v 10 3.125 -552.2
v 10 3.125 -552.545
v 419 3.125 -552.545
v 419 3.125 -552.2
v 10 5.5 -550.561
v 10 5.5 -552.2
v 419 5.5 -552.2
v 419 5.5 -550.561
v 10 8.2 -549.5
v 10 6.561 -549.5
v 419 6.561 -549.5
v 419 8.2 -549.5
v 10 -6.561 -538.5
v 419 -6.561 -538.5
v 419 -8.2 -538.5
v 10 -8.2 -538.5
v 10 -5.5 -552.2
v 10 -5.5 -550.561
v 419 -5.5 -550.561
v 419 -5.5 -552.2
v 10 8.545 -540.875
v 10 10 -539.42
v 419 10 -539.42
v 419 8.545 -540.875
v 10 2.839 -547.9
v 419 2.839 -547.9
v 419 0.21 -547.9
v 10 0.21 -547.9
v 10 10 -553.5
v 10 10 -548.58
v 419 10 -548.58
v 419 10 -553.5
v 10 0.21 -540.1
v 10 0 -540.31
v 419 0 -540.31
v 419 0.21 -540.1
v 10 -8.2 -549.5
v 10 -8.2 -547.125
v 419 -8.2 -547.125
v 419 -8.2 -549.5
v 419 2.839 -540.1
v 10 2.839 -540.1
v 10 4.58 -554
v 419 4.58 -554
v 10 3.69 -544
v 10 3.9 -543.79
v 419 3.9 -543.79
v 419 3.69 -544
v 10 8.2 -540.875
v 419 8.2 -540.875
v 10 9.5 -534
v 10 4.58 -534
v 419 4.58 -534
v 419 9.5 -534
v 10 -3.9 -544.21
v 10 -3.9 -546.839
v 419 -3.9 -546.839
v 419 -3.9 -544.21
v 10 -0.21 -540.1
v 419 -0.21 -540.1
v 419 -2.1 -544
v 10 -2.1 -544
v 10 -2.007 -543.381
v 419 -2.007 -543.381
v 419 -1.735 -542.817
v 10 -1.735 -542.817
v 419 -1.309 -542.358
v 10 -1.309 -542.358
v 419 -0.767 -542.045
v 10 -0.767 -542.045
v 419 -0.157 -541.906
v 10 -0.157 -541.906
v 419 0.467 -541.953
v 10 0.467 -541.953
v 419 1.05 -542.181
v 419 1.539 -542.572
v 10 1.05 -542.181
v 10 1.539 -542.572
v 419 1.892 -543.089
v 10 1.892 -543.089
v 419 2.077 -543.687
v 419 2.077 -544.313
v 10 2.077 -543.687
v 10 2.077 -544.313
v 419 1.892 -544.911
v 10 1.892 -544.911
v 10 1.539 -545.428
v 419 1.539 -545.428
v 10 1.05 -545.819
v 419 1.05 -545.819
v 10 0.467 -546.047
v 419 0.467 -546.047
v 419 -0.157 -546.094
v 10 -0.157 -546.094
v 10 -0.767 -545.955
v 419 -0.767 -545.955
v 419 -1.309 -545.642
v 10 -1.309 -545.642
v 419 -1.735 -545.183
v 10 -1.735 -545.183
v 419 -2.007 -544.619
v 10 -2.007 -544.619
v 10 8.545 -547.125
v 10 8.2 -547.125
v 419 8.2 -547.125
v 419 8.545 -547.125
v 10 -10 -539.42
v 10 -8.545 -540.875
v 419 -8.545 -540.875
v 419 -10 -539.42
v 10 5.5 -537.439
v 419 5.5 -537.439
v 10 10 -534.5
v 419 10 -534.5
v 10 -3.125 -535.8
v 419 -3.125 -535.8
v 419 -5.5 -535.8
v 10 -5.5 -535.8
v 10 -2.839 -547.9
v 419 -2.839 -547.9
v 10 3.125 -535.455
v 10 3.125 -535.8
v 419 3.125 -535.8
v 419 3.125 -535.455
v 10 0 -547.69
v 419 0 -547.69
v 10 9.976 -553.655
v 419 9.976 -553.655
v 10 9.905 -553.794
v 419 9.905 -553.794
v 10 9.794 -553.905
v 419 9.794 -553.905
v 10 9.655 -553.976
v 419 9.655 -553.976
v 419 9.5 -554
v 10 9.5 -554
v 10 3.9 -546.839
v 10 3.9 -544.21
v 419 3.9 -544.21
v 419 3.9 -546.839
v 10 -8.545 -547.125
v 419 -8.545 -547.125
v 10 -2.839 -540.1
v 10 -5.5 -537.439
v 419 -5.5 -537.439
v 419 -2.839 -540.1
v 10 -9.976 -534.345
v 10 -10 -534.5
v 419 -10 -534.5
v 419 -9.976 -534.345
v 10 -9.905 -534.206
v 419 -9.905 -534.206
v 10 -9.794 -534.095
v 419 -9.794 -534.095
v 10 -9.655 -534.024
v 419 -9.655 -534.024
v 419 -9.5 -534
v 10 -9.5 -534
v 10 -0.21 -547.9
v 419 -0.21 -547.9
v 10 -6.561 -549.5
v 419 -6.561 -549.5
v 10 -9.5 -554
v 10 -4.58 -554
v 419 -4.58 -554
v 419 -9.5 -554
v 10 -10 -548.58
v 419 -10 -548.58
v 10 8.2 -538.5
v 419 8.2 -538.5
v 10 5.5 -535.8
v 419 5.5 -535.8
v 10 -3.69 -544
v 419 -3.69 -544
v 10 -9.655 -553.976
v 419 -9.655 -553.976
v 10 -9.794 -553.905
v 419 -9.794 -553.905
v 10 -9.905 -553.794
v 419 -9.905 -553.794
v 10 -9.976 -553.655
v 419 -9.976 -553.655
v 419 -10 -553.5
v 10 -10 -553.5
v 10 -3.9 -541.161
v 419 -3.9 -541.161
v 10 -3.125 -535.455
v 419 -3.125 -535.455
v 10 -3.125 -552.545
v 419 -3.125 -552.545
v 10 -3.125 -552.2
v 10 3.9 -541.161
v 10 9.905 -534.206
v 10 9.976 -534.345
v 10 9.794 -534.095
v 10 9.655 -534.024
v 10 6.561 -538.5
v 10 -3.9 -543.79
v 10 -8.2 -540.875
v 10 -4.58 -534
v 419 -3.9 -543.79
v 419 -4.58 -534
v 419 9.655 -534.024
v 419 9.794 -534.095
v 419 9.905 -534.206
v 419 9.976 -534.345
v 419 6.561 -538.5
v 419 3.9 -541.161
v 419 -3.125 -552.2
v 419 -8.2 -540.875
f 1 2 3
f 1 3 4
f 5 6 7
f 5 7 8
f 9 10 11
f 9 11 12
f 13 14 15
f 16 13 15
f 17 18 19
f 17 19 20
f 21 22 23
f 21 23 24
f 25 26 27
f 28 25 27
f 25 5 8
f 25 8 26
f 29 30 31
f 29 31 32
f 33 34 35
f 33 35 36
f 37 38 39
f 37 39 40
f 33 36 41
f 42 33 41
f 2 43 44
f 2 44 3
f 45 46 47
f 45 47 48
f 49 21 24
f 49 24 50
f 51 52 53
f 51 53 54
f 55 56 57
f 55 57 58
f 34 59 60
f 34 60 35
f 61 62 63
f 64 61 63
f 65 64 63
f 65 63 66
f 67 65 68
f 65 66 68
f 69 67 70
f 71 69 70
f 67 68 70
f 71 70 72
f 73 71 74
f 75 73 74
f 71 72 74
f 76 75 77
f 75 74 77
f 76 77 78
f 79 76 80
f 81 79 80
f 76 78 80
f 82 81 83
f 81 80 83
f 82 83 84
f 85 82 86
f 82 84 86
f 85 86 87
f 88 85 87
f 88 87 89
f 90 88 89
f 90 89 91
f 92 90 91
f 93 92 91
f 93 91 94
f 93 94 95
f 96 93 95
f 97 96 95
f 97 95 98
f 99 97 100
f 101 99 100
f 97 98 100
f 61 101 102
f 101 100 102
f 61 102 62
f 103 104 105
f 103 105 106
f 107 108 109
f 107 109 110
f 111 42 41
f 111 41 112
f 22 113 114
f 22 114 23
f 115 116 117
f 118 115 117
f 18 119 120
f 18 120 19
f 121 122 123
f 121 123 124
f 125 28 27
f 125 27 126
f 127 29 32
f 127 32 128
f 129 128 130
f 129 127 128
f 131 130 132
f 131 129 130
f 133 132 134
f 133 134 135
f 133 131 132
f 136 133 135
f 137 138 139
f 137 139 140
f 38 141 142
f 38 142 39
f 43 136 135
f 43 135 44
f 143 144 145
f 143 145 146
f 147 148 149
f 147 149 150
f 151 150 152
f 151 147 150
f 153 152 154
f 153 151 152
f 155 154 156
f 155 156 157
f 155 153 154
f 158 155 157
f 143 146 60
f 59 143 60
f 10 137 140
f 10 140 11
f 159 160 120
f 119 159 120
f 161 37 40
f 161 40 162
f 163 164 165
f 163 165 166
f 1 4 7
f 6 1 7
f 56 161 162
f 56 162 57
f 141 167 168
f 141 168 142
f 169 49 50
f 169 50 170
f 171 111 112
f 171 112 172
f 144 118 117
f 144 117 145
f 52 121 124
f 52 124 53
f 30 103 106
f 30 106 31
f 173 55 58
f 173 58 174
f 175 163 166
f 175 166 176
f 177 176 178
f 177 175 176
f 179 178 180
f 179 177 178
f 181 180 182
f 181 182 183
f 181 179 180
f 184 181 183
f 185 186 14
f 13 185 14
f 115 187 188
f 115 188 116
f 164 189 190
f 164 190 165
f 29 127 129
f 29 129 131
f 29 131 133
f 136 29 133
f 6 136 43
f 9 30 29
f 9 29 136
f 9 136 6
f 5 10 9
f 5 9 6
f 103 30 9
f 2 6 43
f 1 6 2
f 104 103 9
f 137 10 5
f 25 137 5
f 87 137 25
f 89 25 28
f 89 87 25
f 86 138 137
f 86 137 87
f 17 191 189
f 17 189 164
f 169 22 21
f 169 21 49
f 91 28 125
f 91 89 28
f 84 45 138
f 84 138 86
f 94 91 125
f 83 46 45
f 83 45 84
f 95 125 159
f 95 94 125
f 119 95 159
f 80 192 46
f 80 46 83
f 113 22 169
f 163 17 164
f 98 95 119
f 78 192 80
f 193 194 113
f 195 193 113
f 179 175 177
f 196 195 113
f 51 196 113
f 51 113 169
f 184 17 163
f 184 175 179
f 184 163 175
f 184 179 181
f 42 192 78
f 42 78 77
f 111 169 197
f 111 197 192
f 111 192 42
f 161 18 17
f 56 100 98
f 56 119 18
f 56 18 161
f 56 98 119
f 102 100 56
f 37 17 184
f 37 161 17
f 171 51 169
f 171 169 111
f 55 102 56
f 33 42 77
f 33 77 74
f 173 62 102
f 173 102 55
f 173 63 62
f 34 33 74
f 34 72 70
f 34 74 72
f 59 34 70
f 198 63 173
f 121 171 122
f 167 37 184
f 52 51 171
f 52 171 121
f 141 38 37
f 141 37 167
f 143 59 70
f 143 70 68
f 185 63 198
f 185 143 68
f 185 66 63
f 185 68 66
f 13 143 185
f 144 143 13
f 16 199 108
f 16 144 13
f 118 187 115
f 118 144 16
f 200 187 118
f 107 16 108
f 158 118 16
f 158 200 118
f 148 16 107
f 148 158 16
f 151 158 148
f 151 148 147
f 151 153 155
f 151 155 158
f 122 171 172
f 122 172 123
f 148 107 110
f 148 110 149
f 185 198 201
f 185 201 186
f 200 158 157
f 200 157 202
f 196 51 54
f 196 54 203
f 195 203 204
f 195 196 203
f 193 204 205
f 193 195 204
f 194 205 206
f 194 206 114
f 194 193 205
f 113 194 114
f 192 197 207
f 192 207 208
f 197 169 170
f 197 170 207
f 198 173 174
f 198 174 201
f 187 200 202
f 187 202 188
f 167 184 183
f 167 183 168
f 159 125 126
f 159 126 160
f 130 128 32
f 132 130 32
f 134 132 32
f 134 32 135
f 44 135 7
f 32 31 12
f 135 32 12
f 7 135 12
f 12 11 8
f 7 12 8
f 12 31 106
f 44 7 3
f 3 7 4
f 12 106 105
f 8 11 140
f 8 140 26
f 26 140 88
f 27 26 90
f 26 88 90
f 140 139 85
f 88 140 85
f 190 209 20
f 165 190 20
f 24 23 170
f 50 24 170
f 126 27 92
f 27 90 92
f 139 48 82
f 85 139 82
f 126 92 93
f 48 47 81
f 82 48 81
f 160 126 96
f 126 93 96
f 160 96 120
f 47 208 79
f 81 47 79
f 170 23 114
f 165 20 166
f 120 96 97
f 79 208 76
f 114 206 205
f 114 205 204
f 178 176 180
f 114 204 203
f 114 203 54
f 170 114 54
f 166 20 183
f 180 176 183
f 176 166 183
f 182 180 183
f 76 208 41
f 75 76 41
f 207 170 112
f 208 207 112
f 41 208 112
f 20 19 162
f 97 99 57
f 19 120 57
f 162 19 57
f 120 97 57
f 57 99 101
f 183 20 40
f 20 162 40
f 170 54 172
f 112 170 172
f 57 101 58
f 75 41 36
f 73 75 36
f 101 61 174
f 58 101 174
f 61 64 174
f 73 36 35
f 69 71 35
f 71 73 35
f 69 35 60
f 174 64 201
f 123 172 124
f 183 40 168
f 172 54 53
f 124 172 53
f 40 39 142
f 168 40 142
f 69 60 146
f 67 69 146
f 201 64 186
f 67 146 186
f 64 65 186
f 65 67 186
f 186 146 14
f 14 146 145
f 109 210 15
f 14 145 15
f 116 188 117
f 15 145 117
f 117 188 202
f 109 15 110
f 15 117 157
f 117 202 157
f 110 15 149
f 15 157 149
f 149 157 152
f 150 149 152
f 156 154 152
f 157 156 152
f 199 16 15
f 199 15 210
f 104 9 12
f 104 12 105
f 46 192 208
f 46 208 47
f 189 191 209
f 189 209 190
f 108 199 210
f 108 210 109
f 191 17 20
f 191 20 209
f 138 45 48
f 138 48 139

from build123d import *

# Parameters (mm, degrees)
SKETCH1_R           = 2.1
BOSS_EXTRUDE1_DEPTH = 409


with BuildPart() as part:
    # Sketch1 → Boss-Extrude1 (new body)
    with BuildSketch(Plane(origin=(10, 0, 0), x_dir=(0, -1, 0), z_dir=(-1, 0, 0))):
        with BuildLine():
            Line((-10, -534.5), (-10, -539.42))
            Line((-10, -539.42), (-8.545, -540.875))
            Line((-8.545, -540.875), (-8.2, -540.875))
            Line((-8.2, -540.875), (-8.2, -538.5))
            Line((-8.2, -538.5), (-6.560660172, -538.5))
            Line((-6.560660172, -538.5), (-3.9, -541.160660172))
            Line((-3.9, -541.160660172), (-3.9, -543.79))
            Line((-3.9, -543.79), (-3.69, -544))
            Line((-3.69, -544), (-3.9, -544.21))
            Line((-3.9, -544.21), (-3.9, -546.839339828))
            Line((-3.9, -546.839339828), (-6.560660172, -549.5))
            Line((-6.560660172, -549.5), (-8.2, -549.5))
            Line((-8.2, -549.5), (-8.2, -547.125))
            Line((-8.2, -547.125), (-8.545, -547.125))
            Line((-8.545, -547.125), (-10, -548.58))
            Line((-10, -548.58), (-10, -553.5))
            ThreePointArc((-10, -553.5), (-9.853553391, -553.853553391), (-9.5, -554))
            Line((-9.5, -554), (-4.58, -554))
            Line((-4.58, -554), (-3.125, -552.545))
            Line((-3.125, -552.545), (-3.125, -552.2))
            Line((-3.125, -552.2), (-5.5, -552.2))
            Line((-5.5, -552.2), (-5.5, -550.560660172))
            Line((-5.5, -550.560660172), (-2.839339828, -547.9))
            Line((-2.839339828, -547.9), (-0.21, -547.9))
            Line((-0.21, -547.9), (0, -547.69))
            Line((0, -547.69), (0.21, -547.9))
            Line((0.21, -547.9), (2.839339828, -547.9))
            Line((2.839339828, -547.9), (5.5, -550.560660172))
            Line((5.5, -550.560660172), (5.5, -552.2))
            Line((5.5, -552.2), (3.125, -552.2))
            Line((3.125, -552.2), (3.125, -552.545))
            Line((3.125, -552.545), (4.58, -554))
            Line((4.58, -554), (9.5, -554))
            ThreePointArc((9.5, -554), (9.853553391, -553.853553391), (10, -553.5))
            Line((10, -553.5), (10, -548.58))
            Line((10, -548.58), (8.545, -547.125))
            Line((8.545, -547.125), (8.2, -547.125))
            Line((8.2, -547.125), (8.2, -549.5))
            Line((8.2, -549.5), (6.560660172, -549.5))
            Line((6.560660172, -549.5), (3.9, -546.839339828))
            Line((3.9, -546.839339828), (3.9, -544.21))
            Line((3.9, -544.21), (3.69, -544))
            Line((3.69, -544), (3.9, -543.79))
            Line((3.9, -543.79), (3.9, -541.160660171))
            Line((3.9, -541.160660171), (6.560660171, -538.5))
            Line((6.560660171, -538.5), (8.2, -538.5))
            Line((8.2, -538.5), (8.2, -540.875))
            Line((8.2, -540.875), (8.545, -540.875))
            Line((8.545, -540.875), (10, -539.42))
            Line((10, -539.42), (10, -534.5))
            ThreePointArc((10, -534.5), (9.853553391, -534.146446609), (9.5, -534))
            Line((9.5, -534), (4.58, -534))
            Line((4.58, -534), (3.125, -535.455))
            Line((3.125, -535.455), (3.125, -535.8))
            Line((3.125, -535.8), (5.5, -535.8))
            Line((5.5, -535.8), (5.5, -537.439339828))
            Line((5.5, -537.439339828), (2.839339828, -540.1))
            Line((2.839339828, -540.1), (0.21, -540.1))
            Line((0.21, -540.1), (0, -540.31))
            Line((0, -540.31), (-0.21, -540.1))
            Line((-0.21, -540.1), (-2.839339828, -540.1))
            Line((-2.839339828, -540.1), (-5.5, -537.439339828))
            Line((-5.5, -537.439339828), (-5.5, -535.8))
            Line((-5.5, -535.8), (-3.125, -535.8))
            Line((-3.125, -535.8), (-3.125, -535.455))
            Line((-3.125, -535.455), (-4.58, -534))
            Line((-4.58, -534), (-9.5, -534))
            ThreePointArc((-9.5, -534), (-9.853553391, -534.146446609), (-10, -534.5))
        make_face()
        with Locations((0, -544)):
            Circle(SKETCH1_R, mode=Mode.SUBTRACT)
    extrude(amount=-BOSS_EXTRUDE1_DEPTH)


solid = part.part
